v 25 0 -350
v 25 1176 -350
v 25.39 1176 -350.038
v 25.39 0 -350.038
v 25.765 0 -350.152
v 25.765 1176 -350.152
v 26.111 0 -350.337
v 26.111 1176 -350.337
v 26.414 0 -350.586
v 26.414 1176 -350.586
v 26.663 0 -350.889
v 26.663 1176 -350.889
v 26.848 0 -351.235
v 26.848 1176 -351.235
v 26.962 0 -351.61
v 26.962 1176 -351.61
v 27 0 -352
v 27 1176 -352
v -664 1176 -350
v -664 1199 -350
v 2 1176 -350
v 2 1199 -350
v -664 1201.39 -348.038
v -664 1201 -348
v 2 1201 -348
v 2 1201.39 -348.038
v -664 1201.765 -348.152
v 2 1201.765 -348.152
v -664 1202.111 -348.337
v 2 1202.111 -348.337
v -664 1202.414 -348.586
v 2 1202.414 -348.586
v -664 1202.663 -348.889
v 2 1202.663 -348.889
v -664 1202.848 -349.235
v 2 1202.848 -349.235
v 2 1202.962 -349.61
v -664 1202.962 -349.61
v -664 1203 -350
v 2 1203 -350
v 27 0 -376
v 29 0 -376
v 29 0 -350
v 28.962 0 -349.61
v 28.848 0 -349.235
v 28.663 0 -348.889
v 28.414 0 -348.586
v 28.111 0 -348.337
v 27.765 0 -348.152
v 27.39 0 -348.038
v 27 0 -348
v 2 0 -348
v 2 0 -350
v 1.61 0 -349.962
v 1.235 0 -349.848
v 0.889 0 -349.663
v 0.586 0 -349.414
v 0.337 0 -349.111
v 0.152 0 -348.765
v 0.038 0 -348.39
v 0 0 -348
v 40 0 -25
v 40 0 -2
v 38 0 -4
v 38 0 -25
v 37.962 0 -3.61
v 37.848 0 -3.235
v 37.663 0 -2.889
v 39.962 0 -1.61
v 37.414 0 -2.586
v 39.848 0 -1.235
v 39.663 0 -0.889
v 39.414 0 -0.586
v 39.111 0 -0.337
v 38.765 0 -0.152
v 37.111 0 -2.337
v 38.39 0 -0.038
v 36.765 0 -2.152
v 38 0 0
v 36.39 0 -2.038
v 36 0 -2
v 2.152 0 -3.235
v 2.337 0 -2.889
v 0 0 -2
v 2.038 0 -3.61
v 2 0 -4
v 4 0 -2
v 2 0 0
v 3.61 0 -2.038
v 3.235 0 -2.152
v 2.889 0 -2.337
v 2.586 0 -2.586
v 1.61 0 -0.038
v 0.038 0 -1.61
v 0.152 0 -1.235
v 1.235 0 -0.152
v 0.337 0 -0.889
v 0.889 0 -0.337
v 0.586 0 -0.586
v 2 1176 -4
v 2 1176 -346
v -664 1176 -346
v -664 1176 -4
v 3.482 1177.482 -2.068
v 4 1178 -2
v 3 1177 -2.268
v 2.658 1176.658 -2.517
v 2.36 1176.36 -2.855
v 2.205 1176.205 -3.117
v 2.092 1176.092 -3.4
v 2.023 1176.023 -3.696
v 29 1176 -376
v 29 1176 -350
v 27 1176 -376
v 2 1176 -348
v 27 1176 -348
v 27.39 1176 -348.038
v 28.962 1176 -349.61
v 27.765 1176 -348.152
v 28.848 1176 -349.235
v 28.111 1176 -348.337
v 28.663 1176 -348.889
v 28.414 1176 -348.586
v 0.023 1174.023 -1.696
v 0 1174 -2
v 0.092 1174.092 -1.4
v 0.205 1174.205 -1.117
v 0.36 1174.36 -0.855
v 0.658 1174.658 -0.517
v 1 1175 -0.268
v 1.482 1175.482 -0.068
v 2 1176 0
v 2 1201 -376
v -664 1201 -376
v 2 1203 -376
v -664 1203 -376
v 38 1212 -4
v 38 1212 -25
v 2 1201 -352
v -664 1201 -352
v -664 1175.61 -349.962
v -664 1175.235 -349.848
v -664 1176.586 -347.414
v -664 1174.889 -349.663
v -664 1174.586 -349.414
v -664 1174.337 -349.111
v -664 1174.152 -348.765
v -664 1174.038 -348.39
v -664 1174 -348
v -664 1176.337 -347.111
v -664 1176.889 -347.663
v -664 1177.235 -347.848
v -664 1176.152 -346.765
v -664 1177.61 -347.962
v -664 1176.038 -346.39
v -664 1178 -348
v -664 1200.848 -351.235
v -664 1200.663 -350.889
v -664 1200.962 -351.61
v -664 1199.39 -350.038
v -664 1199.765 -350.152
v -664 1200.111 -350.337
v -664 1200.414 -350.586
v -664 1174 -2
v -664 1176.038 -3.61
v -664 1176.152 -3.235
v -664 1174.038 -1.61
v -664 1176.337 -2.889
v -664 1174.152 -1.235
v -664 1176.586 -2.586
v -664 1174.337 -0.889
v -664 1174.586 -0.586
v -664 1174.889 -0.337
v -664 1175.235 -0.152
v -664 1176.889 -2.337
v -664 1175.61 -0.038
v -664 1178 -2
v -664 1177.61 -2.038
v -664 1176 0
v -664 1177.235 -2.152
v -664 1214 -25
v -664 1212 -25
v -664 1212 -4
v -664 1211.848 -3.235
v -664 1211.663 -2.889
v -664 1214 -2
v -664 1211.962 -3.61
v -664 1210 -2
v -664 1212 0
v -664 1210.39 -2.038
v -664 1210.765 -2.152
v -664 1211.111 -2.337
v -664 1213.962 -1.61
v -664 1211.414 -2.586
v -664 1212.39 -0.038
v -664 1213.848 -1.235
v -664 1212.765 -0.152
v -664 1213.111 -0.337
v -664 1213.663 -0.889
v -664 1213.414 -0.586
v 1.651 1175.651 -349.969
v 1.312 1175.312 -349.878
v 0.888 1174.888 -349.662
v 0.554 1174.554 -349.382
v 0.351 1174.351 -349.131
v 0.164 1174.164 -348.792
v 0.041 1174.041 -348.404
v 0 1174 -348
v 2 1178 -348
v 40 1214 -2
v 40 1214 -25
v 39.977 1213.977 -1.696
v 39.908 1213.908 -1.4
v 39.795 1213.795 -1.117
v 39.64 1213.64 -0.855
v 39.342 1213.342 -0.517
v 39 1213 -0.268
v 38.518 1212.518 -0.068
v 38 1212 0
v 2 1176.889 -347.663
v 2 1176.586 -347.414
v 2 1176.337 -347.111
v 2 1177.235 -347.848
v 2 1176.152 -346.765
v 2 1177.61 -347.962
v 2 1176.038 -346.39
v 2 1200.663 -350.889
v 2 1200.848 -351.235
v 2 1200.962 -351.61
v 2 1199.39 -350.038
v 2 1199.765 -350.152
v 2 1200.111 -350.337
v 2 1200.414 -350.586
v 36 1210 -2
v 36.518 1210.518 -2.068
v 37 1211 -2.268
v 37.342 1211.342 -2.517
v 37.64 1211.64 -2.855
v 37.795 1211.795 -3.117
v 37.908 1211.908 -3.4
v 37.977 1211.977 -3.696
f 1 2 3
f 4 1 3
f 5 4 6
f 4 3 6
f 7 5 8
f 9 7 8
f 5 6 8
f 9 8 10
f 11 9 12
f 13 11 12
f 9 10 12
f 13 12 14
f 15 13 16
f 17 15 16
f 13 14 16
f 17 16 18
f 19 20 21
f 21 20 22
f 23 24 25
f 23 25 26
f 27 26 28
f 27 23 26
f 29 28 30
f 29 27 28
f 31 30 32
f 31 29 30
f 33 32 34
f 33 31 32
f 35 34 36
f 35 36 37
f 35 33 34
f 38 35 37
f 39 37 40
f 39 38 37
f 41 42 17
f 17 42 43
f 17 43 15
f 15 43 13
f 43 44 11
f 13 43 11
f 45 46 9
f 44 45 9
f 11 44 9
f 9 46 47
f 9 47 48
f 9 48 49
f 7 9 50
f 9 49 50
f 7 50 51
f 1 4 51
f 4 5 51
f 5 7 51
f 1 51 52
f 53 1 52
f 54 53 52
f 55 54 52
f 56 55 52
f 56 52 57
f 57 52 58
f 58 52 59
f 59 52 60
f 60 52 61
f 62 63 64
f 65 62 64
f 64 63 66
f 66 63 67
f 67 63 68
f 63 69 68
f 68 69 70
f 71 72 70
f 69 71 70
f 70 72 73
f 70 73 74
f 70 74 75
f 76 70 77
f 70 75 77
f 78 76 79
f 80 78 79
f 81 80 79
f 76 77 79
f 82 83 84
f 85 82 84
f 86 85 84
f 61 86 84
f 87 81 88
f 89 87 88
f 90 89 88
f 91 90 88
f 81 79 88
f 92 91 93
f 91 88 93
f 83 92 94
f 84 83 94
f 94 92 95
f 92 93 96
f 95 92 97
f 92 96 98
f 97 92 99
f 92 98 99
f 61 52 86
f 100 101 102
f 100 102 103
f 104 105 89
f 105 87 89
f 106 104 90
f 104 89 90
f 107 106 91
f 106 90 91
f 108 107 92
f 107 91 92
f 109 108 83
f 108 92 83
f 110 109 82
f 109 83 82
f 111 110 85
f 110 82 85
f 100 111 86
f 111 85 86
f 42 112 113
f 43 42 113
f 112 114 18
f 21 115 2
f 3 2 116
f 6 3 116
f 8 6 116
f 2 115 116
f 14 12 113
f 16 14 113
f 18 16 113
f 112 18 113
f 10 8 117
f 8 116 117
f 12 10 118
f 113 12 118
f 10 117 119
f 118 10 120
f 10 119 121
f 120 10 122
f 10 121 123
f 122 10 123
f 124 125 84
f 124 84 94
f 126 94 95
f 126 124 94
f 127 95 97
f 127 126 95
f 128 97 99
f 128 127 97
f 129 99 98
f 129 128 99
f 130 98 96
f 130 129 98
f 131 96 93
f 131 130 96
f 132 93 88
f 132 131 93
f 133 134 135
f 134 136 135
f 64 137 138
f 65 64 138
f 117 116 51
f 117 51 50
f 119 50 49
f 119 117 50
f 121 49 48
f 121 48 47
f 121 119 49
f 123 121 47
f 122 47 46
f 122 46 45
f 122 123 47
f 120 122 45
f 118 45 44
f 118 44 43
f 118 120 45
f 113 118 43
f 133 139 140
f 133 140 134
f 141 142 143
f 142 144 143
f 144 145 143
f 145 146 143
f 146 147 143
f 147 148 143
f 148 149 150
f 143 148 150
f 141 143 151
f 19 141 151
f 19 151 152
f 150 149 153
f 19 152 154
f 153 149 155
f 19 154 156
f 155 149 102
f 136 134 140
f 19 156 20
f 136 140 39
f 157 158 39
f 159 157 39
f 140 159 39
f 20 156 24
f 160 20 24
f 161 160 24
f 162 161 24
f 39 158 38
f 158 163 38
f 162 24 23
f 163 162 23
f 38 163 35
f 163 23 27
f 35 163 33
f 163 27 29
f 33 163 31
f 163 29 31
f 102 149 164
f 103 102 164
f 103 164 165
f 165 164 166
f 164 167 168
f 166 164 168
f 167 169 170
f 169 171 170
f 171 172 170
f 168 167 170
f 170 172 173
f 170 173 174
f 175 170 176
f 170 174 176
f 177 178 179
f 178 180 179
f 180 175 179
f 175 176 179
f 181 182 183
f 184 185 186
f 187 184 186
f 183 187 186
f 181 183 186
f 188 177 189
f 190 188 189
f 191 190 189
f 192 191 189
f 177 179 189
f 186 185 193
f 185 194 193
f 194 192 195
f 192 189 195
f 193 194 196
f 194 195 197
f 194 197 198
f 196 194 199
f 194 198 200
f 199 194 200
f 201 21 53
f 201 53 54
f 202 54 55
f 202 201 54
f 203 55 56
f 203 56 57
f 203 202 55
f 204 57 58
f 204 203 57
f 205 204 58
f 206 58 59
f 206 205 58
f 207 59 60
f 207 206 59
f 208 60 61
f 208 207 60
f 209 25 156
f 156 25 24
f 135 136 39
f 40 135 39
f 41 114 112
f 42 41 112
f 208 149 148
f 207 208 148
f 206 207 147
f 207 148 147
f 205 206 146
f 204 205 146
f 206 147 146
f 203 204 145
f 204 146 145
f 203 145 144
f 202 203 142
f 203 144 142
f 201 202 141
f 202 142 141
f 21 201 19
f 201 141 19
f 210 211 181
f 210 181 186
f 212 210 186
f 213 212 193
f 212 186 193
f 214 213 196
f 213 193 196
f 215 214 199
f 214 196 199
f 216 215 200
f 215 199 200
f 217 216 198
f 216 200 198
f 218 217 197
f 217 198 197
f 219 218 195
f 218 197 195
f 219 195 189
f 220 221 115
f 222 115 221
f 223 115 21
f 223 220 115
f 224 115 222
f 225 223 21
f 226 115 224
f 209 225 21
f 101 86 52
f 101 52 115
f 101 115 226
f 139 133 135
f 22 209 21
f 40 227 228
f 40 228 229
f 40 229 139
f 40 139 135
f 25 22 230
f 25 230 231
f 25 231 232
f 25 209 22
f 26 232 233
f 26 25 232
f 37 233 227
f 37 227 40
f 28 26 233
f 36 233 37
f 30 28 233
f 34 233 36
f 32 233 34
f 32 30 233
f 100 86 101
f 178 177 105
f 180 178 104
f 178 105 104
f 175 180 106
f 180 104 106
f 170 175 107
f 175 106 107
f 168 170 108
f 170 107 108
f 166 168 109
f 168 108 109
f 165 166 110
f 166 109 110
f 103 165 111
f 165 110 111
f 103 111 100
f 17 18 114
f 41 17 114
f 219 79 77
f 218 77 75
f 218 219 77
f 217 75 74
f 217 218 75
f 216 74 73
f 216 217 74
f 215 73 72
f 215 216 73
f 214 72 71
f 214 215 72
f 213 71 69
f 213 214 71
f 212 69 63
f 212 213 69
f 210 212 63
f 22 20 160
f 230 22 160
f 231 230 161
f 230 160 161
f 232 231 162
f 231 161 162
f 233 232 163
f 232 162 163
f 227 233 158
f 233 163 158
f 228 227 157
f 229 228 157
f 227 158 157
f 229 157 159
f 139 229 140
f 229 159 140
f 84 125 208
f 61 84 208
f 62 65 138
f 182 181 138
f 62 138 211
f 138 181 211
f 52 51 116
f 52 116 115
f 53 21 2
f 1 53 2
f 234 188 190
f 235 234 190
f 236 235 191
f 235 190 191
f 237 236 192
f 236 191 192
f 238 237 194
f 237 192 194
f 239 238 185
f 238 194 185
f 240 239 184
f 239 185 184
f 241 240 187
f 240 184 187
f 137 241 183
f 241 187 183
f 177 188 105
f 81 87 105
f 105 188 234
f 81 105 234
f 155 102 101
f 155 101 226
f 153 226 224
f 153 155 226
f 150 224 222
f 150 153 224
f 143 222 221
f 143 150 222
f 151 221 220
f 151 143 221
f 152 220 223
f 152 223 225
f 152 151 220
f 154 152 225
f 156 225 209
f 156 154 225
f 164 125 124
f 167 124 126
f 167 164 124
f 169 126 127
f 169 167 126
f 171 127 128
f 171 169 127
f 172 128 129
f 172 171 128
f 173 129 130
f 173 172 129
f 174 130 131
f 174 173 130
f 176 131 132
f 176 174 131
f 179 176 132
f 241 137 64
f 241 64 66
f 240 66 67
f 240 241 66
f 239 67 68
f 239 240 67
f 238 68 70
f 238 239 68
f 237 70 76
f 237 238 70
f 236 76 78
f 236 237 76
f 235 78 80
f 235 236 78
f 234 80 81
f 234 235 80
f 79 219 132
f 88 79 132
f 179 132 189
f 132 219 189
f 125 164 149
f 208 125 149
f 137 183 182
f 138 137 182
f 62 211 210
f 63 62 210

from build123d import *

# Parameters (mm, degrees)
F3_W         = 27
F3_H         = 27
F4_DEPTH     = 30
F5_T1_DEPTH  = 666
F5_T3_DEPTH  = 702
F5_T5_DEPTH  = 1176
F5_T7_DEPTH  = 1212
F5_T13_DEPTH = 1181
F5_T17_DEPTH = 671
F5_T20_DEPTH = 669
F5_T22_DEPTH = 676
F5_T24_DEPTH = 714
F5_T26_DEPTH = 1224
F5_T28_DEPTH = 1179
F5_T30_DEPTH = 1186
F5_T36_DEPTH = 674
F5_T40_DEPTH = 1184
F5_T47_DEPTH = 674
F5_T51_DEPTH = 1184


# Not quite as in the source:
# - a fillet or chamfer that OpenCascade refuses, or shapes differently, is made with other operations: its cross-section is extruded or revolved along the edge and cut away or added


with BuildPart() as f2:
    # F2: sweep along a path in F1
    with BuildLine(Plane.XY) as f2_path:
        Line((0, 0), (0, 1174))
        Line((0, 1174), (-664, 1174))
    # F0 (on Front) → F2 (sweep)
    with BuildSketch(Plane.XZ):
        Polygon((38, -2), (38, -25), (40, -25), (40, 0), (0, 0), (0, -350), (27, -350), (27, -376), (29, -376), (29, -348), (2, -348), (2, -2), align=None)
    sweep(path=f2_path.line, transition=Transition.RIGHT)

    # F3 (on face) → F4 (cut)
    with BuildSketch(Plane.XY.offset(-348)):
        with Locations((15.5, 1189.5)):
            Rectangle(F3_W, F3_H)
    extrude(amount=-F4_DEPTH, mode=Mode.SUBTRACT)

    # F5: fillet of radius 2 on 15 edges, made by hand

    # F5_s2 → F5_t1 (join)
    with BuildSketch(Plane.YZ.offset(-664)):
        with BuildLine():
            ThreePointArc((1199, -350), (1200.4142135624, -350.5857864376), (1201, -352))
            Line((1201, -352), (1201, -350))
            Line((1201, -350), (1199, -350))
        make_face()
        with BuildLine():
            ThreePointArc((1176, -346), (1176.5857864376, -347.4142135624), (1178, -348))
            Line((1178, -348), (1176, -348))
            Line((1176, -348), (1176, -346))
        make_face()
        with BuildLine():
            ThreePointArc((1178, -2), (1176.5857864376, -2.5857864376), (1176, -4))
            Line((1176, -4), (1176, -2))
            Line((1176, -2), (1178, -2))
        make_face()
    extrude(amount=F5_T1_DEPTH)

    # F5_s4 → F5_t3 (join)
    with BuildSketch(Plane.YZ.offset(-664)):
        with BuildLine():
            ThreePointArc((1210, -2), (1211.4142135624, -2.5857864376), (1212, -4))
            Line((1212, -4), (1212, -2))
            Line((1212, -2), (1210, -2))
        make_face()
    extrude(amount=F5_T3_DEPTH)

    # F5_s6 → F5_t5 (join)
    with BuildSketch(Plane.XZ.offset(-1176)):
        with BuildLine():
            ThreePointArc((25, -350), (26.4142135624, -350.5857864376), (27, -352))
            Line((27, -352), (27, -350))
            Line((27, -350), (25, -350))
        make_face()
        with BuildLine():
            ThreePointArc((4, -2), (2.5857864376, -2.5857864376), (2, -4))
            Line((2, -4), (2, -2))
            Line((2, -2), (4, -2))
        make_face()
    extrude(amount=F5_T5_DEPTH)

    # F5_s8 → F5_t7 (join)
    with BuildSketch(Plane.XZ.offset(-1212)):
        with BuildLine():
            ThreePointArc((38, -4), (37.4142135624, -2.5857864376), (36, -2))
            Line((36, -2), (38, -2))
            Line((38, -2), (38, -4))
        make_face()
    extrude(amount=F5_T7_DEPTH)


with BuildPart() as f5_tool11:
    # F5_s12 → F5_t13 (new body)
    with BuildSketch(Plane.XZ):
        with BuildLine():
            ThreePointArc((4, -2), (2.5857864376, -2.5857864376), (2, -4))
            Line((2, -4), (2, -2))
            Line((2, -2), (4, -2))
        make_face()
    extrude(amount=-F5_T13_DEPTH)

    split(bisect_by=Plane.XZ.offset(-1176), keep=Keep.BOTTOM)


with BuildPart() as f5_tool15:
    # F5_s16 → F5_t17 (new body)
    with BuildSketch(Plane.YZ.offset(7)):
        with BuildLine():
            ThreePointArc((1178, -2), (1176.5857864376, -2.5857864376), (1176, -4))
            Line((1176, -4), (1176, -2))
            Line((1176, -2), (1178, -2))
        make_face()
    extrude(amount=-F5_T17_DEPTH)

    split(bisect_by=Plane.YZ.offset(2), keep=Keep.TOP)


with BuildPart() as f5_tool11_1:
    add(f5_tool11.part)

    # F5_t19: intersect F5_tool15
    add(f5_tool15.part, mode=Mode.INTERSECT)


with BuildPart() as f2_1:
    add(f2.part)

    # F5_t9: union F5_tool11
    add(f5_tool11_1.part)

    # F5_s21 → F5_t20 (cut)
    with BuildSketch(Plane.YZ.offset(-669)):
        with BuildLine():
            ThreePointArc((1174, -348), (1174.5857864376, -349.4142135624), (1176, -350))
            Line((1176, -350), (1174, -350))
            Line((1174, -350), (1174, -348))
        make_face()
        with BuildLine():
            ThreePointArc((1174, -2), (1174.5857864376, -0.5857864376), (1176, 0))
            Line((1176, 0), (1174, 0))
            Line((1174, 0), (1174, -2))
        make_face()
    extrude(amount=F5_T20_DEPTH, mode=Mode.SUBTRACT)

    # F5_s23 → F5_t22 (cut)
    with BuildSketch(Plane.YZ.offset(-669)):
        with BuildLine():
            ThreePointArc((1201, -348), (1202.4142135624, -348.5857864376), (1203, -350))
            Line((1203, -350), (1203, -348))
            Line((1203, -348), (1201, -348))
        make_face()
    extrude(amount=F5_T22_DEPTH, mode=Mode.SUBTRACT)

    # F5_s25 → F5_t24 (cut)
    with BuildSketch(Plane.YZ.offset(-669)):
        with BuildLine():
            ThreePointArc((1214, -2), (1213.4142135624, -0.5857864376), (1212, 0))
            Line((1212, 0), (1214, 0))
            Line((1214, 0), (1214, -2))
        make_face()
    extrude(amount=F5_T24_DEPTH, mode=Mode.SUBTRACT)

    # F5_s27 → F5_t26 (cut)
    with BuildSketch(Plane.XZ.offset(-1219)):
        with BuildLine():
            ThreePointArc((38, 0), (39.4142135624, -0.5857864376), (40, -2))
            Line((40, -2), (40, 0))
            Line((40, 0), (38, 0))
        make_face()
    extrude(amount=F5_T26_DEPTH, mode=Mode.SUBTRACT)

    # F5_s29 → F5_t28 (cut)
    with BuildSketch(Plane.XZ.offset(-1174)):
        with BuildLine():
            ThreePointArc((0, -2), (0.5857864376, -0.5857864376), (2, 0))
            Line((2, 0), (0, 0))
            Line((0, 0), (0, -2))
        make_face()
        with BuildLine():
            ThreePointArc((2, -350), (0.5857864376, -349.4142135624), (0, -348))
            Line((0, -348), (0, -350))
            Line((0, -350), (2, -350))
        make_face()
    extrude(amount=F5_T28_DEPTH, mode=Mode.SUBTRACT)

    # F5_s31 → F5_t30 (cut)
    with BuildSketch(Plane.XZ.offset(-1181)):
        with BuildLine():
            ThreePointArc((27, -348), (28.4142135624, -348.5857864376), (29, -350))
            Line((29, -350), (29, -348))
            Line((29, -348), (27, -348))
        make_face()
    extrude(amount=F5_T30_DEPTH, mode=Mode.SUBTRACT)


with BuildPart() as f5_tool34:
    # F5_s35 → F5_t36 (new body)
    with BuildSketch(Plane.YZ.offset(5)):
        with BuildLine():
            ThreePointArc((1174, -348), (1174.5857864376, -349.4142135624), (1176, -350))
            Line((1176, -350), (1174, -350))
            Line((1174, -350), (1174, -348))
        make_face()
    extrude(amount=-F5_T36_DEPTH)

    split(bisect_by=Plane.YZ, keep=Keep.TOP)


with BuildPart() as f5_tool38:
    # F5_s39 → F5_t40 (new body)
    with BuildSketch(Plane.XZ.offset(5)):
        with BuildLine():
            ThreePointArc((2, -350), (0.5857864376, -349.4142135624), (0, -348))
            Line((0, -348), (0, -350))
            Line((0, -350), (2, -350))
        make_face()
    extrude(amount=-F5_T40_DEPTH)

    split(bisect_by=Plane.XZ.offset(-1174), keep=Keep.BOTTOM)


with BuildPart() as f5_tool34_1:
    add(f5_tool34.part)

    # F5_t42: intersect F5_tool38
    add(f5_tool38.part, mode=Mode.INTERSECT)


with BuildPart() as f2_2:
    add(f2_1.part)

    # F5_t32: cut F5_tool34
    add(f5_tool34_1.part, mode=Mode.SUBTRACT)


with BuildPart() as f5_tool45:
    # F5_s46 → F5_t47 (new body)
    with BuildSketch(Plane.YZ.offset(5)):
        with BuildLine():
            ThreePointArc((1174, -2), (1174.5857864376, -0.5857864376), (1176, 0))
            Line((1176, 0), (1174, 0))
            Line((1174, 0), (1174, -2))
        make_face()
    extrude(amount=-F5_T47_DEPTH)

    split(bisect_by=Plane.YZ, keep=Keep.TOP)


with BuildPart() as f5_tool49:
    # F5_s50 → F5_t51 (new body)
    with BuildSketch(Plane.XZ.offset(5)):
        with BuildLine():
            ThreePointArc((0, -2), (0.5857864376, -0.5857864376), (2, 0))
            Line((2, 0), (0, 0))
            Line((0, 0), (0, -2))
        make_face()
    extrude(amount=-F5_T51_DEPTH)

    split(bisect_by=Plane.XZ.offset(-1174), keep=Keep.BOTTOM)


with BuildPart() as f5_tool45_1:
    add(f5_tool45.part)

    # F5_t53: intersect F5_tool49
    add(f5_tool49.part, mode=Mode.INTERSECT)


with BuildPart() as f2_3:
    add(f2_2.part)

    # F5_t43: cut F5_tool45
    add(f5_tool45_1.part, mode=Mode.SUBTRACT)


solid = f2_3.part
